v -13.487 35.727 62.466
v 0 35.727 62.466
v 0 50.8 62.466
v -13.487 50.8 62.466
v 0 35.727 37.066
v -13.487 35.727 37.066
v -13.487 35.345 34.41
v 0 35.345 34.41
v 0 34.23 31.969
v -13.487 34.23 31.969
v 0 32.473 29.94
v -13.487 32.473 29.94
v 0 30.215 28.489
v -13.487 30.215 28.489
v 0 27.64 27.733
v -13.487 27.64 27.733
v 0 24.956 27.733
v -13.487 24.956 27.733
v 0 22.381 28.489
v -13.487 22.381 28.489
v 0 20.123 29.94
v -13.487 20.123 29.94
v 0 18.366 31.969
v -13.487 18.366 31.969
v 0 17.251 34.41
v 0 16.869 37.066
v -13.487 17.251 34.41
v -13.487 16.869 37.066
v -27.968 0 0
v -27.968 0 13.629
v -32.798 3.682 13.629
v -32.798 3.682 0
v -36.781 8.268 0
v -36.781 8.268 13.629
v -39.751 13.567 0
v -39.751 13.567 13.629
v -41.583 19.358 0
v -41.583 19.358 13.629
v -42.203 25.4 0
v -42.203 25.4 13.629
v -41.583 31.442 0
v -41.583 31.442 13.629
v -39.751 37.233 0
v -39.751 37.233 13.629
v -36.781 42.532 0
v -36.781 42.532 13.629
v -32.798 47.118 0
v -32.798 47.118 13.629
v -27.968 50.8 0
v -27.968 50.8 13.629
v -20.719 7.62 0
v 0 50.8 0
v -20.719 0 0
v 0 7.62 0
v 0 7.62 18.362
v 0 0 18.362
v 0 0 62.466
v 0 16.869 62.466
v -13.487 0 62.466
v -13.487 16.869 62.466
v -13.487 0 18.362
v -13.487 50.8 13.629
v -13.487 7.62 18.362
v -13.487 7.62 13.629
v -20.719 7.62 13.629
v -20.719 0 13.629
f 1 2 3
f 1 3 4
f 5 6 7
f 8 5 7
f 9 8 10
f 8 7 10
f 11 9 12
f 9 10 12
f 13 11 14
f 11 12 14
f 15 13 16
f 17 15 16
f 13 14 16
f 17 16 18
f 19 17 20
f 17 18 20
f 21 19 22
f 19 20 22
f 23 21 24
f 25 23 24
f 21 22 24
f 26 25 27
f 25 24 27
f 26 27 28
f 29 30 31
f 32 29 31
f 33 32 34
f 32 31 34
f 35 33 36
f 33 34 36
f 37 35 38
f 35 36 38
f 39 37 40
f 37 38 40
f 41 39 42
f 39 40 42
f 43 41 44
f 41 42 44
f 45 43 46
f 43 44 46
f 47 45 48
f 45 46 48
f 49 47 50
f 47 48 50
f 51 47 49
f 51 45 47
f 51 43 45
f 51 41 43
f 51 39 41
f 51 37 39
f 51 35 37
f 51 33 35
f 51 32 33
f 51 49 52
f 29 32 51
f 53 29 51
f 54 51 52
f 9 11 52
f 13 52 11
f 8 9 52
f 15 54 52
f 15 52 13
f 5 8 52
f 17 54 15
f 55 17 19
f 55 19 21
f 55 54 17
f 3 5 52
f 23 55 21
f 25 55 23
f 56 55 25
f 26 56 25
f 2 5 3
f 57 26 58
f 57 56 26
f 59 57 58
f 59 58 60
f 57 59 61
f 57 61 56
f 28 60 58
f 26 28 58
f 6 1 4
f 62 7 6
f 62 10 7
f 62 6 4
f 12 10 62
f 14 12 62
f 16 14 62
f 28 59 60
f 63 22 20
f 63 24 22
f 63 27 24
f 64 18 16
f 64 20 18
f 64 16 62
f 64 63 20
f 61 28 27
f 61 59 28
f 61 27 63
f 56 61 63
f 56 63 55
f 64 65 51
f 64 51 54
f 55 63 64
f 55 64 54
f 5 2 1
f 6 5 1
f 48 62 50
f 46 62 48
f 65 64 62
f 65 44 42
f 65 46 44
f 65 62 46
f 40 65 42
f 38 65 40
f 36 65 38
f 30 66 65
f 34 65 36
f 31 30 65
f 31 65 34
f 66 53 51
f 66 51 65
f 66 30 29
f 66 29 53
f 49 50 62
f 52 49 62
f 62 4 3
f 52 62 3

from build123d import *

# Parameters (mm, degrees)
F1_DEPTH = 50.8
F3_DEPTH = 25.4
F4_W     = 26.0413559154
F4_H     = 20.6534923054
F5_DEPTH = 7.62
F7_DEPTH = 25.4
F9_DEPTH = 25.4


with BuildPart() as f1:
    # F0 (on Front) → F1 (new body)
    with BuildSketch(Plane.XZ):
        Polygon((-42.4485914409, 0), (0, 0), (0, 62.4661669135), (-13.4870102629, 62.4661669135), (-13.4870102629, 13.6289829388), (-42.4485914409, 13.6289829388), align=None)
    extrude(amount=-F1_DEPTH)

    # F2 (on face) → F3 (cut)
    with BuildSketch(Plane.XY.offset(13.6289829388)):
        with BuildLine():
            ThreePointArc((-27.9678008519, 0), (-42.2028744607, 25.4), (-27.9678008519, 50.8))
            Line((-27.9678008519, 50.8), (-42.4485914409, 50.8))
            Line((-42.4485914409, 50.8), (-42.4485914409, 0))
            Line((-42.4485914409, 0), (-27.9678008519, 0))
        make_face()
    extrude(amount=-F3_DEPTH, mode=Mode.SUBTRACT)

    # F4 (on face) → F5 (cut)
    with BuildSketch(Plane.XZ):
        with Locations((-7.6980530284, 8.0353214871)):
            Rectangle(F4_W, F4_H)
    extrude(amount=-F5_DEPTH, mode=Mode.SUBTRACT)

    # F6 (on face) → F7 (cut)
    with BuildSketch(Plane.XY.offset(62.4661669135)):
        Polygon((0, 16.8692115694), (0, 25.4), (0, 35.7267484069), (-13.4870102629, 35.7267484069), (-13.4870102629, 16.8692115694), align=None)
    extrude(amount=-F7_DEPTH, mode=Mode.SUBTRACT)

    # F8 (on face) → F9 (cut)
    with BuildSketch(Plane(origin=(-13.4870102629, 0, 0), x_dir=(0, -1, 0), z_dir=(-1, 0, 0))):
        with BuildLine():
            Line((-16.8692115694, 37.0661669135), (-35.7267484069, 37.0661669135))
            ThreePointArc((-35.7267484069, 37.0661669135), (-26.2979799882, 27.6373984948), (-16.8692115694, 37.0661669135))
        make_face()
    extrude(amount=-F9_DEPTH, mode=Mode.SUBTRACT)


solid = f1.part
